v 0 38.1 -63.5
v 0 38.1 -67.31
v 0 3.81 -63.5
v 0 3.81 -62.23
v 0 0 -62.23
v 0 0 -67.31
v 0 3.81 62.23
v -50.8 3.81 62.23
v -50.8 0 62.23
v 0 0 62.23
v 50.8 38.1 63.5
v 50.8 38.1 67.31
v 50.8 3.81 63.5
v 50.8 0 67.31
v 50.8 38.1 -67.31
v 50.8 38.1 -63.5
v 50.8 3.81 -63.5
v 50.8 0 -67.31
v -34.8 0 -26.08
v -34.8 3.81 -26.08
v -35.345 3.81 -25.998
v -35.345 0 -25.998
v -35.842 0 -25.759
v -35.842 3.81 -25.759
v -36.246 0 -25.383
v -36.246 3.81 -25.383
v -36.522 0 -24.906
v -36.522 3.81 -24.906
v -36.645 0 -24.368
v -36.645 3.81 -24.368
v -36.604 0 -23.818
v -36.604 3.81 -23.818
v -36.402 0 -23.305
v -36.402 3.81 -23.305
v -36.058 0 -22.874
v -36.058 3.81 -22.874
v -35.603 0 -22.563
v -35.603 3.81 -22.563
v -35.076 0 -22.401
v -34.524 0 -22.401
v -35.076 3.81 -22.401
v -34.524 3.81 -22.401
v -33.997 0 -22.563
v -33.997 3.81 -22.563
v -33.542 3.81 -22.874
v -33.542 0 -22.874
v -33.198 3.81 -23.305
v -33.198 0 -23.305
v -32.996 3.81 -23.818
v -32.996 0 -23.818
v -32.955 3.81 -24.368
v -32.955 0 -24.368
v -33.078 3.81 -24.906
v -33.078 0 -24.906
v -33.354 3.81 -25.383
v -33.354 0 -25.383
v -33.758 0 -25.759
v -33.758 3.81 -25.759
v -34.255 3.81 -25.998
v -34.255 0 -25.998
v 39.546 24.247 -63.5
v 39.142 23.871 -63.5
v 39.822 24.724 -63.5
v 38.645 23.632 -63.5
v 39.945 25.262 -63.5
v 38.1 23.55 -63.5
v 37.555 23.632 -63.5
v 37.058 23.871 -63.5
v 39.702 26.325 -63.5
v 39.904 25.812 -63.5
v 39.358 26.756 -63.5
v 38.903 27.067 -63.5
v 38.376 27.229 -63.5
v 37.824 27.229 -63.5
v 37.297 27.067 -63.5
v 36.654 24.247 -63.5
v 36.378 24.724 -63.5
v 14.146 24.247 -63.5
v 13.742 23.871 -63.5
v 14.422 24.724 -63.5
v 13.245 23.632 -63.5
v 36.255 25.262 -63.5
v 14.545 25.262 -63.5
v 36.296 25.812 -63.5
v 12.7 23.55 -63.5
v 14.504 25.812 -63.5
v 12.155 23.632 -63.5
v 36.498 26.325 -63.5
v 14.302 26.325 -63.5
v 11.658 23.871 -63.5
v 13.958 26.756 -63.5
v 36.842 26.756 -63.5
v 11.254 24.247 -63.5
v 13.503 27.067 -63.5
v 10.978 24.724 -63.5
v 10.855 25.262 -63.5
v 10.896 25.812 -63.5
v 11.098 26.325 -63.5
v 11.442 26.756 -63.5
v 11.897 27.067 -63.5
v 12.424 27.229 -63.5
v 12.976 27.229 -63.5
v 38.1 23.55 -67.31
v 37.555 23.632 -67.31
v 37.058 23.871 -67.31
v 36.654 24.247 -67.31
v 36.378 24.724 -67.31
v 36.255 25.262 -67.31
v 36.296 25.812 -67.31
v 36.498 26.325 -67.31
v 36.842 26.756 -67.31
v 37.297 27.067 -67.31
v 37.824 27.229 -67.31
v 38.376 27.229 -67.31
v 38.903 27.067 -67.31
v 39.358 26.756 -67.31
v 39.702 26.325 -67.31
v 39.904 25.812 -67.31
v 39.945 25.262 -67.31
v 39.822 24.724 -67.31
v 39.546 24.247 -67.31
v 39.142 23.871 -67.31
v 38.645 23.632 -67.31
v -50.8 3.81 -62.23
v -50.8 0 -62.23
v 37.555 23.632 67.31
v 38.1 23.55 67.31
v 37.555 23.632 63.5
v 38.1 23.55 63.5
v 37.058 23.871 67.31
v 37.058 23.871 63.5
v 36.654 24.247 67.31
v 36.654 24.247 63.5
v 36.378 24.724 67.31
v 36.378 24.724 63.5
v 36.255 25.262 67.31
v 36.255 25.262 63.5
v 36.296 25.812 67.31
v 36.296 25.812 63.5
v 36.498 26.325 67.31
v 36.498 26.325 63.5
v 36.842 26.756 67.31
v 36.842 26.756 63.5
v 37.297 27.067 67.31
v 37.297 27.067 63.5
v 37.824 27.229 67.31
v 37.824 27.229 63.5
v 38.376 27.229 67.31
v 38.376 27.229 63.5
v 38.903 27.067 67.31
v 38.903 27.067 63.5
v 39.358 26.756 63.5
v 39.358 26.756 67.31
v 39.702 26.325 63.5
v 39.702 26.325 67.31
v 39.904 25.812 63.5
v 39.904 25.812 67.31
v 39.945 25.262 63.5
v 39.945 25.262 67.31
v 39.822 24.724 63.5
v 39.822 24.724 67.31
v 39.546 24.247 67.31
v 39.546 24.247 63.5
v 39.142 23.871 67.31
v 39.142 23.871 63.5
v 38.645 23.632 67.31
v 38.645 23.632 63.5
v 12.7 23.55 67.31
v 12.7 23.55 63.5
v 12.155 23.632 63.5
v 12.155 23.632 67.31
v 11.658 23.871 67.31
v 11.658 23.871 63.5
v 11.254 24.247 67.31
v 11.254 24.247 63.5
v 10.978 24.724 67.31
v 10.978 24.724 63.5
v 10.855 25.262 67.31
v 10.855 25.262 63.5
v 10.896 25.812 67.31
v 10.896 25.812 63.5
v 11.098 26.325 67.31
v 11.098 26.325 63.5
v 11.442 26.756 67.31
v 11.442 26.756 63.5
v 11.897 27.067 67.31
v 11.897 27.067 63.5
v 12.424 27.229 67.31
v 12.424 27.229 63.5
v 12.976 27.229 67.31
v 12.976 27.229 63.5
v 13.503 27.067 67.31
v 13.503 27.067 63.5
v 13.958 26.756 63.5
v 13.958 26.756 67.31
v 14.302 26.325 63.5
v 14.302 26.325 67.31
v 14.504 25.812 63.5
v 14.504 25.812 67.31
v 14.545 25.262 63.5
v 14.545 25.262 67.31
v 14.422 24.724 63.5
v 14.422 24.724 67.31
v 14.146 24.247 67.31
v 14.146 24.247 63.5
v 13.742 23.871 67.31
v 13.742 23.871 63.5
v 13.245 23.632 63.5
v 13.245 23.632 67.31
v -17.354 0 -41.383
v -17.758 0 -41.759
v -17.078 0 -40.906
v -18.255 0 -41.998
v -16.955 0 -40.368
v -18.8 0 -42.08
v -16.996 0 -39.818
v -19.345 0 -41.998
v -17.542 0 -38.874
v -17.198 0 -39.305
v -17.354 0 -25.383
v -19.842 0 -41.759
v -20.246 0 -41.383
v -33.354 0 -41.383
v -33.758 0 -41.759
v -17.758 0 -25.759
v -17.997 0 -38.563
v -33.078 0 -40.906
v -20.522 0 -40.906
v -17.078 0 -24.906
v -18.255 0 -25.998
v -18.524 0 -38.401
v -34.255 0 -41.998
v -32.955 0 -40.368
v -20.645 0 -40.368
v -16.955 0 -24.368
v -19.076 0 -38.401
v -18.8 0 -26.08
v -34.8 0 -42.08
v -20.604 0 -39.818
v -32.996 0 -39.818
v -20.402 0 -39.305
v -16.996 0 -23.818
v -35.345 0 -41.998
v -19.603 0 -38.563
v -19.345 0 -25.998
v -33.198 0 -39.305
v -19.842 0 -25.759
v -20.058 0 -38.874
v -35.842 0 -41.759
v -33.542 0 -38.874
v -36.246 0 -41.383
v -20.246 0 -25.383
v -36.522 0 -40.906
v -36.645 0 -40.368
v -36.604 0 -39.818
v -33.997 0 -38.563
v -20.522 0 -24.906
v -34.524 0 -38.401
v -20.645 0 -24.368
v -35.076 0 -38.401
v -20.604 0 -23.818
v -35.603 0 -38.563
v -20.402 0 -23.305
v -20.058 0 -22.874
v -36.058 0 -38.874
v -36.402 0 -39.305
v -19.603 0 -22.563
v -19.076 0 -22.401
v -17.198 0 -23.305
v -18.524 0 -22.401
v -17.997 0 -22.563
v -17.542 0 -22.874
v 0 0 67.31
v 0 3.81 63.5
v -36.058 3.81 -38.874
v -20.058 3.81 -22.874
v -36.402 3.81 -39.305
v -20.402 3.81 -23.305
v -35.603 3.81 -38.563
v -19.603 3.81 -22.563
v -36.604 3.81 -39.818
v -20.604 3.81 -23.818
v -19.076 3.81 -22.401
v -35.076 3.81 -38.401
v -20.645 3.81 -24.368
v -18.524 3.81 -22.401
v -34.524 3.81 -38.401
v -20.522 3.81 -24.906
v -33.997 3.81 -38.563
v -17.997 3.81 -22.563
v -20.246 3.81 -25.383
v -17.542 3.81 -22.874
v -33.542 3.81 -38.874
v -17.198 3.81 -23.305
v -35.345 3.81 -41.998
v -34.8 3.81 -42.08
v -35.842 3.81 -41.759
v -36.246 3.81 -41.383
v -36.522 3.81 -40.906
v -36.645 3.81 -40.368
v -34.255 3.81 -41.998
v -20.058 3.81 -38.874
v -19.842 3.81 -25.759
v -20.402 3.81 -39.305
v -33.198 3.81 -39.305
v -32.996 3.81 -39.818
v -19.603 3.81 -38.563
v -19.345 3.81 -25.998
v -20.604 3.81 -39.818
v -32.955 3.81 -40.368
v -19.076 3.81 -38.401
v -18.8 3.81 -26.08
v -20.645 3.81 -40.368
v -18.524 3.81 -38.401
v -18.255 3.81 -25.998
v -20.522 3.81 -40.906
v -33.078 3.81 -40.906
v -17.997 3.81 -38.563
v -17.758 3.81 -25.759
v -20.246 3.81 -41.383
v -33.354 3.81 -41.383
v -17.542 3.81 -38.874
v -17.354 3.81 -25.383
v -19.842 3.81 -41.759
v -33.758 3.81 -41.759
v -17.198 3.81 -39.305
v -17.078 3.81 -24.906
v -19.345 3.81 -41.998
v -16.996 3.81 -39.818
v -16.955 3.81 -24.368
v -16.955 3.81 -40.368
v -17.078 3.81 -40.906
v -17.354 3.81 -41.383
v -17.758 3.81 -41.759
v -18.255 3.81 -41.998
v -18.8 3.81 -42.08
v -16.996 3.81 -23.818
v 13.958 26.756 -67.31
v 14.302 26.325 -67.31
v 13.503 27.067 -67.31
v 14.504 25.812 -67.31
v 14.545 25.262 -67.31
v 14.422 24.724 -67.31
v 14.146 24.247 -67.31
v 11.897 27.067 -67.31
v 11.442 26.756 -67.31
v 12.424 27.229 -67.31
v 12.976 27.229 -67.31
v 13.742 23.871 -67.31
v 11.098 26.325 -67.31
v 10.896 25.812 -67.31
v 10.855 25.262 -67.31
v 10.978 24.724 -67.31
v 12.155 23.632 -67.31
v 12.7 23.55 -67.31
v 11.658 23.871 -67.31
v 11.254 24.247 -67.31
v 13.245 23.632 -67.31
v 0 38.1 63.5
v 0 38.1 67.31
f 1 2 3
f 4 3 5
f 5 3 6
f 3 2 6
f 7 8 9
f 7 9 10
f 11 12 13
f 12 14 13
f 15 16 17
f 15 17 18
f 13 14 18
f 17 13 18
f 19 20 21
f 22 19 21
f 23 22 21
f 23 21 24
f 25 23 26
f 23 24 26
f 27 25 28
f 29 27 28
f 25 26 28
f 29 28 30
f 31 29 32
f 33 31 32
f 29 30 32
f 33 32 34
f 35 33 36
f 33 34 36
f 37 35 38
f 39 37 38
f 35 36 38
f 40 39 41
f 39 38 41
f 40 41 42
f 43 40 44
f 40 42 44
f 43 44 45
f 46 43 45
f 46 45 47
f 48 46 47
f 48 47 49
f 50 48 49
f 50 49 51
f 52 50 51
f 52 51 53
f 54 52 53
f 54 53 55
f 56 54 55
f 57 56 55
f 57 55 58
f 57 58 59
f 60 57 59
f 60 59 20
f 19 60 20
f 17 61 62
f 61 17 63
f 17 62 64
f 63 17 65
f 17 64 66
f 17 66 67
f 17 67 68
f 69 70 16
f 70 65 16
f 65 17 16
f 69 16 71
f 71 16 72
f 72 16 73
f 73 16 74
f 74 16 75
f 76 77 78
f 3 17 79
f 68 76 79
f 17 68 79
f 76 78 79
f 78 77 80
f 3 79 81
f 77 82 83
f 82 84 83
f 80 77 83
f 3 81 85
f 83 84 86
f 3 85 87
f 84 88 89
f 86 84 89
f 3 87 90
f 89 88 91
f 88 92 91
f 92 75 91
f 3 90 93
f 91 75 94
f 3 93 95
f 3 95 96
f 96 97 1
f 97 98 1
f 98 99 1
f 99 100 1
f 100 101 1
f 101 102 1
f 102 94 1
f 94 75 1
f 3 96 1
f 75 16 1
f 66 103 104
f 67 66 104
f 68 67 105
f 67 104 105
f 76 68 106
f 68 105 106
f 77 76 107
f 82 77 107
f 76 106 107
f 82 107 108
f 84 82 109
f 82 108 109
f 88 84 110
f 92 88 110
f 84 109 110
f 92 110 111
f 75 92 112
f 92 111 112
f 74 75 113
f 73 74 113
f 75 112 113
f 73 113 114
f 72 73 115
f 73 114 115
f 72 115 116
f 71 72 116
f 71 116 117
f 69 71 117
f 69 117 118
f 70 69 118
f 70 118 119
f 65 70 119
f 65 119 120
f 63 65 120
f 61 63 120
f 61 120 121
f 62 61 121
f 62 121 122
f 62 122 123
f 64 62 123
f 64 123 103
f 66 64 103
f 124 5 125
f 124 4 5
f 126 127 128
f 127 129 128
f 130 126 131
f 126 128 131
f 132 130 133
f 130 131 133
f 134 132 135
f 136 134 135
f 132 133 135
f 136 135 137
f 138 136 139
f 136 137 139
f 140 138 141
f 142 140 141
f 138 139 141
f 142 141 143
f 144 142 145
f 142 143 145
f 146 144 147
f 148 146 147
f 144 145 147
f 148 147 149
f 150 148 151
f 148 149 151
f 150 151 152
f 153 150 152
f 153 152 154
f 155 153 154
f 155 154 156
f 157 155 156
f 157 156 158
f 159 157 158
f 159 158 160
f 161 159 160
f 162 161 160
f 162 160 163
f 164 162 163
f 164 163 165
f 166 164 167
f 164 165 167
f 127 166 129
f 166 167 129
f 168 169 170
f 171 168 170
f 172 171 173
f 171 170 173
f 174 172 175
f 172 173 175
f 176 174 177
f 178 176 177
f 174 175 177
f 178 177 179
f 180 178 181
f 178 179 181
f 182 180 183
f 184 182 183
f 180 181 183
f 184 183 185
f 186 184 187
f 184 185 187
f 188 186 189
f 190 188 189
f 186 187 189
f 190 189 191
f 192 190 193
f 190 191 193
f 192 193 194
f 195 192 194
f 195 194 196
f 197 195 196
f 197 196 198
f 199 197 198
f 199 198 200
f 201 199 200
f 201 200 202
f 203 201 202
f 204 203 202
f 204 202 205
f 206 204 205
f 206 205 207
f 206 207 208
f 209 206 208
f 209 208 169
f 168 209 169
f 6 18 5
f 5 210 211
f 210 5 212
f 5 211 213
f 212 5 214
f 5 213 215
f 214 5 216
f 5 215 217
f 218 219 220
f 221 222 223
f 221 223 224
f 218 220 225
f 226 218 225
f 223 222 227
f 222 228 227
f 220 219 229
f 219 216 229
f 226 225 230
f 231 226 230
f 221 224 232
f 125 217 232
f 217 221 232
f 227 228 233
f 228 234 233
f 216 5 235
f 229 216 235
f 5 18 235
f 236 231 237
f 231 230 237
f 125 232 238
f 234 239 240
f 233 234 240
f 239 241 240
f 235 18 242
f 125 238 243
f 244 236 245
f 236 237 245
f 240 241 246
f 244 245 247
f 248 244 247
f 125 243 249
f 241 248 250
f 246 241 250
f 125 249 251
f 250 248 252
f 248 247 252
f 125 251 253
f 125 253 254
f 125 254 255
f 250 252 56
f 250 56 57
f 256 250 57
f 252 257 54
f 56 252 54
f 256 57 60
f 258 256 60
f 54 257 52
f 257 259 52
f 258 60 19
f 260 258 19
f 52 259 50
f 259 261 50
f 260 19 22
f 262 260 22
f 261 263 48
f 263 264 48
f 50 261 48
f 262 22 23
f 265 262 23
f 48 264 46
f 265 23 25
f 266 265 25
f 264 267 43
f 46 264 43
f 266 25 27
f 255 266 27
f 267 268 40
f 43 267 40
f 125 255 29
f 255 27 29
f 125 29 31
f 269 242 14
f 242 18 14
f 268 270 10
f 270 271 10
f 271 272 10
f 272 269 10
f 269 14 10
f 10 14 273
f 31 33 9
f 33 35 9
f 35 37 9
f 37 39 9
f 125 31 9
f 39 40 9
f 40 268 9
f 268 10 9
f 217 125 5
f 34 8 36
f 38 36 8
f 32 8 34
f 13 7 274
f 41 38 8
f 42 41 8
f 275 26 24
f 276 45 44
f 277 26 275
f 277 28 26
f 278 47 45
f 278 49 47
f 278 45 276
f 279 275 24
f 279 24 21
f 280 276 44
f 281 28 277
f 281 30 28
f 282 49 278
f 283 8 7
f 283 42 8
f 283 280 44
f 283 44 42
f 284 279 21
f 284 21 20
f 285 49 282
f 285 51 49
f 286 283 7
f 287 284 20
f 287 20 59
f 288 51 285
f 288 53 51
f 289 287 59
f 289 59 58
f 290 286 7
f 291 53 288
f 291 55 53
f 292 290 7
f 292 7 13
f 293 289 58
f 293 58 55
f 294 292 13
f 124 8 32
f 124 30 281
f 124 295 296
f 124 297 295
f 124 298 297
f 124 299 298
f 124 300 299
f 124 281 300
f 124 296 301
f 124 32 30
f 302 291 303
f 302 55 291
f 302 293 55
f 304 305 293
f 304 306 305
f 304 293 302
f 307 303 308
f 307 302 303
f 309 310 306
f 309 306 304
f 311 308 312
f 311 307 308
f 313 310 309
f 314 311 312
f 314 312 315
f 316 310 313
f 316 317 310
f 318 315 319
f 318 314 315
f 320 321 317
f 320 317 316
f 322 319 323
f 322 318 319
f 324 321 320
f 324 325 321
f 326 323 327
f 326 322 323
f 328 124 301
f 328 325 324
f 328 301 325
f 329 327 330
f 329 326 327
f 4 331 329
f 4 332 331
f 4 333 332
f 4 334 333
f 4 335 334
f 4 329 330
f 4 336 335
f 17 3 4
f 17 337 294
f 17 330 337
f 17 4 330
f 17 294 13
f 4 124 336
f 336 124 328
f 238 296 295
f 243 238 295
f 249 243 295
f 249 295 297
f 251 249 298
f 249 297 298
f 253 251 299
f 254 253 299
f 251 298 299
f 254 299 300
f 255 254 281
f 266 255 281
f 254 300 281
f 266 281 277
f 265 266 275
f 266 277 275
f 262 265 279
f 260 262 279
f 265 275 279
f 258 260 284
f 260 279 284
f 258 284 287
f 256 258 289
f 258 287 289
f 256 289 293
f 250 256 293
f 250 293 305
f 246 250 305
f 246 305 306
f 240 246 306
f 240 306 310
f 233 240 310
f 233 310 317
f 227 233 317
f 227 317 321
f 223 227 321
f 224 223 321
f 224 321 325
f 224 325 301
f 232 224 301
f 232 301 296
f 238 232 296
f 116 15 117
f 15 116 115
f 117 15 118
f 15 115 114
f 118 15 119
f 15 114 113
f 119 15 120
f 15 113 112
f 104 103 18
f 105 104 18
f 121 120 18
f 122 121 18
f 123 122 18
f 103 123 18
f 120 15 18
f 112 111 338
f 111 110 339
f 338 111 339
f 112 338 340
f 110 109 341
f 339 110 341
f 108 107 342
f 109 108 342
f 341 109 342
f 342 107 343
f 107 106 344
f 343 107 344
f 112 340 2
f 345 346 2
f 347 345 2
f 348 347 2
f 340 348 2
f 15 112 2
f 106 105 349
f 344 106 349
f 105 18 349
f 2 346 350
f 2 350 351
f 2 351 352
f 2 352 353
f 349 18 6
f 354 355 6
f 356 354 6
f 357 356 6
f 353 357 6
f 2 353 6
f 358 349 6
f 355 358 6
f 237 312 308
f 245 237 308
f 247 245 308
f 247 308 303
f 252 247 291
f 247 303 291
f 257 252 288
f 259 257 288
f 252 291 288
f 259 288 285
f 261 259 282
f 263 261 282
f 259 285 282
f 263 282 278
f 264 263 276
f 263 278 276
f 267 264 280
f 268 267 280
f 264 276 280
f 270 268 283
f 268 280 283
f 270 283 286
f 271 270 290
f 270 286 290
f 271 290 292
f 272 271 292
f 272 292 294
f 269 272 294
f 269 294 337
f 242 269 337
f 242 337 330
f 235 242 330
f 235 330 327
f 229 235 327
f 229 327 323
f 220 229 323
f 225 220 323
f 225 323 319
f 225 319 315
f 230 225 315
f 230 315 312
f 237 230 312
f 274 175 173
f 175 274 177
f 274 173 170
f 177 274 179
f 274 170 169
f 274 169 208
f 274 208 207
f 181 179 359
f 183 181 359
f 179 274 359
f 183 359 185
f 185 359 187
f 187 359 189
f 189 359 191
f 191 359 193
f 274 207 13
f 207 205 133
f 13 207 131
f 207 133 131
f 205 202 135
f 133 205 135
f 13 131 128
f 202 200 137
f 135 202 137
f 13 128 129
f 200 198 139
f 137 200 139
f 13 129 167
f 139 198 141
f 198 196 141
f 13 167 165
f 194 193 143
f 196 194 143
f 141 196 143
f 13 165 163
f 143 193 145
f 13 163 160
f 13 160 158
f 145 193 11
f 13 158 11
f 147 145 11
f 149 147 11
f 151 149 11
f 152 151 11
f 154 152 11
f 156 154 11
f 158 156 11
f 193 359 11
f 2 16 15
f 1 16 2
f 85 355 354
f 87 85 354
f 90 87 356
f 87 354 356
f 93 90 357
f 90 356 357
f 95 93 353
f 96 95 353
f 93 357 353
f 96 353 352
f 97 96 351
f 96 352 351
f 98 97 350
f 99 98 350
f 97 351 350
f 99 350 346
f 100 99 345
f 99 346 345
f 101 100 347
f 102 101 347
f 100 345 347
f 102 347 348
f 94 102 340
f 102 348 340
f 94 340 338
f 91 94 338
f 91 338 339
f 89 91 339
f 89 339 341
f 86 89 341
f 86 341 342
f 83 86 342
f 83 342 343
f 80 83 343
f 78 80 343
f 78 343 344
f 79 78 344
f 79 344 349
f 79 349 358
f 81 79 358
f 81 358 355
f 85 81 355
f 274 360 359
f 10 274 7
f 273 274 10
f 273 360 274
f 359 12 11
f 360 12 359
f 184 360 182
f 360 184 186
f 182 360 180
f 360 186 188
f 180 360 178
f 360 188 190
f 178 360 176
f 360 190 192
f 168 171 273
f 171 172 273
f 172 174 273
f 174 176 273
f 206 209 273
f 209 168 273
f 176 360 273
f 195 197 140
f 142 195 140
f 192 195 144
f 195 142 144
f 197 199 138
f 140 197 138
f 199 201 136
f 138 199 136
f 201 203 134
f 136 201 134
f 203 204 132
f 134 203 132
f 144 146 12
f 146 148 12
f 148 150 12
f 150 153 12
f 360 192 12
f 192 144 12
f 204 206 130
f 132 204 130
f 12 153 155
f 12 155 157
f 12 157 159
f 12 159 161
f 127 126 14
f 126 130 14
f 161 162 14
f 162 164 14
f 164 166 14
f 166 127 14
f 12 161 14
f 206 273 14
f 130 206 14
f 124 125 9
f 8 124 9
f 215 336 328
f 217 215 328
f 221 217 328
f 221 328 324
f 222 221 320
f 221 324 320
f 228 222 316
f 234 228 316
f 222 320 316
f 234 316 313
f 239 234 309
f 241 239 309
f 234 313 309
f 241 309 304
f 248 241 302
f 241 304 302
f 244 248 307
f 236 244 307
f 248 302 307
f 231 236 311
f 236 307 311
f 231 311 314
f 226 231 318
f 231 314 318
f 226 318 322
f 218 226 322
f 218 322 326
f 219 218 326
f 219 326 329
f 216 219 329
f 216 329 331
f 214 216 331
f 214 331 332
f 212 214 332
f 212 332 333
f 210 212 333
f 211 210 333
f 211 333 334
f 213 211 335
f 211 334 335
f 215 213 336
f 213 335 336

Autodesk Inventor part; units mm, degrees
ref_plane "YZ Plane" through (0, 0, 0) normal (1, 0, 0) x (0, 1, 0)
ref_plane "XZ Plane" through (0, 0, 0) normal (0, 1, 0) x (-1, 0, 0)
ref_plane "XY Plane" through (0, 0, 0) normal (0, 0, 1) x (1, 0, 0)
sketch "Sketch1" plane through (0, 0, 0) normal (0, 1, 0) x (-1, 0, 0)
  line L0 (-50.8, -67.31) -> (50.8, -67.31)
  line L1 (50.8, -67.31) -> (50.8, 67.31)
  line L2 (50.8, 67.31) -> (-50.8, 67.31)
  line L3 (-50.8, 67.31) -> (-50.8, -67.31)
  line L4 (-50.8, -67.31) -> (50.8, 67.31) construction
  line L5 (50.8, -67.31) -> (-50.8, 67.31) construction
  point P0 (0, 0)
  dimension "d0" = 101.6
  dimension "d1" = 134.62
extrude "Extrusion1" add sketch "Sketch1" along normal blind 38.1
sketch "Sketch3" plane through (0, 38.1, 0) normal (0, 1, 0) x (1, 0, 0)
  line L0 (50.8, 63.5) -> (-50.8, 63.5)
  line L1 (-50.8, 63.5) -> (-50.8, -63.5)
  line L2 (-50.8, -63.5) -> (50.8, -63.5)
  line L3 (50.8, -63.5) -> (50.8, 63.5)
  line L4 (50.8, 63.5) -> (-50.8, -63.5) construction
  line L5 (-50.8, 63.5) -> (50.8, -63.5) construction
  point P0 (0, 0)
  dimension "d4" = 127
extrude "Extrusion2" cut sketch "Sketch3" against normal blind 34.29
sketch "Sketch4" plane through (50.8, 0, -67.31) normal (0, 0, -1) x (-1, 0, 0)
  line L0 (101.6, 38.1) -> (50.8, 38.1)
  line L1 (50.8, 38.1) -> (50.8, 0)
  line L2 (50.8, 0) -> (101.6, 0)
  line L3 (101.6, 0) -> (101.6, 38.1)
  dimension "d7" = 50.8
extrude "Extrusion3" cut sketch "Sketch4" against normal blind 5.08
sketch "Sketch5" plane through (-50.8, 0, 67.31) normal (0, 0, 1) x (1, 0, 0)
  line L0 (0, 38.1) -> (0, 3.81) projected
  line L1 (0, 38.1) -> (50.8, 38.1)
  line L2 (50.8, 38.1) -> (50.8, 0)
  line L3 (50.8, 0) -> (0, 0)
  line L4 (0, 0) -> (0, 38.1)
extrude "Extrusion4" cut sketch "Sketch5" against normal blind 5.08
sketch "Sketch6" plane through (50.8, 0, 67.31) normal (0, 0, 1) x (1, 0, 0)
  line L0 (-50.8, 38.1) -> (-38.1, 38.1)
  line L1 (-38.1, 38.1) -> (-38.1, 25.4)
  line L2 (-38.1, 25.4) -> (-50.8, 25.4)
  line L3 (-50.8, 25.4) -> (-50.8, 38.1)
  line L4 (0, 38.1) -> (-50.8, 38.1) projected
  line L5 (0, 38.1) -> (-12.7, 38.1)
  line L6 (-12.7, 38.1) -> (-12.7, 25.4)
  line L7 (-12.7, 25.4) -> (0, 25.4)
  line L8 (0, 25.4) -> (0, 38.1)
  point P0 (-50.8, 0)
  dimension "d12" = 12.7
  dimension "d13" = 12.7
  dimension "d14" = 12.7
hole "Hole1" at (12.7, 25.4, 67.31) at (38.1, 25.4, 67.31) direction (0, 0, -1) diameter 3.7 end through all
sketch "Sketch8" plane through (0, 0, 0) normal (0, -1, 0) x (1, 0, 0)
  circle A0 centre (-18.8, -24.23) radius 1.85 projected
  circle A1 centre (-34.8, -24.23) radius 1.85 projected
  circle A2 centre (-18.8, -40.23) radius 1.85 projected
  circle A3 centre (-34.8, -40.23) radius 1.85 projected
  point P0 (0, 0)
hole "Hole2" at (-18.8, 0, -24.23) at (-34.8, 0, -24.23) at (-34.8, 0, -40.23) at (-18.8, 0, -40.23) direction (0, 1, 0) diameter 3.7 end through all
properties part number "Bucket Top" material "PET Plastic"
